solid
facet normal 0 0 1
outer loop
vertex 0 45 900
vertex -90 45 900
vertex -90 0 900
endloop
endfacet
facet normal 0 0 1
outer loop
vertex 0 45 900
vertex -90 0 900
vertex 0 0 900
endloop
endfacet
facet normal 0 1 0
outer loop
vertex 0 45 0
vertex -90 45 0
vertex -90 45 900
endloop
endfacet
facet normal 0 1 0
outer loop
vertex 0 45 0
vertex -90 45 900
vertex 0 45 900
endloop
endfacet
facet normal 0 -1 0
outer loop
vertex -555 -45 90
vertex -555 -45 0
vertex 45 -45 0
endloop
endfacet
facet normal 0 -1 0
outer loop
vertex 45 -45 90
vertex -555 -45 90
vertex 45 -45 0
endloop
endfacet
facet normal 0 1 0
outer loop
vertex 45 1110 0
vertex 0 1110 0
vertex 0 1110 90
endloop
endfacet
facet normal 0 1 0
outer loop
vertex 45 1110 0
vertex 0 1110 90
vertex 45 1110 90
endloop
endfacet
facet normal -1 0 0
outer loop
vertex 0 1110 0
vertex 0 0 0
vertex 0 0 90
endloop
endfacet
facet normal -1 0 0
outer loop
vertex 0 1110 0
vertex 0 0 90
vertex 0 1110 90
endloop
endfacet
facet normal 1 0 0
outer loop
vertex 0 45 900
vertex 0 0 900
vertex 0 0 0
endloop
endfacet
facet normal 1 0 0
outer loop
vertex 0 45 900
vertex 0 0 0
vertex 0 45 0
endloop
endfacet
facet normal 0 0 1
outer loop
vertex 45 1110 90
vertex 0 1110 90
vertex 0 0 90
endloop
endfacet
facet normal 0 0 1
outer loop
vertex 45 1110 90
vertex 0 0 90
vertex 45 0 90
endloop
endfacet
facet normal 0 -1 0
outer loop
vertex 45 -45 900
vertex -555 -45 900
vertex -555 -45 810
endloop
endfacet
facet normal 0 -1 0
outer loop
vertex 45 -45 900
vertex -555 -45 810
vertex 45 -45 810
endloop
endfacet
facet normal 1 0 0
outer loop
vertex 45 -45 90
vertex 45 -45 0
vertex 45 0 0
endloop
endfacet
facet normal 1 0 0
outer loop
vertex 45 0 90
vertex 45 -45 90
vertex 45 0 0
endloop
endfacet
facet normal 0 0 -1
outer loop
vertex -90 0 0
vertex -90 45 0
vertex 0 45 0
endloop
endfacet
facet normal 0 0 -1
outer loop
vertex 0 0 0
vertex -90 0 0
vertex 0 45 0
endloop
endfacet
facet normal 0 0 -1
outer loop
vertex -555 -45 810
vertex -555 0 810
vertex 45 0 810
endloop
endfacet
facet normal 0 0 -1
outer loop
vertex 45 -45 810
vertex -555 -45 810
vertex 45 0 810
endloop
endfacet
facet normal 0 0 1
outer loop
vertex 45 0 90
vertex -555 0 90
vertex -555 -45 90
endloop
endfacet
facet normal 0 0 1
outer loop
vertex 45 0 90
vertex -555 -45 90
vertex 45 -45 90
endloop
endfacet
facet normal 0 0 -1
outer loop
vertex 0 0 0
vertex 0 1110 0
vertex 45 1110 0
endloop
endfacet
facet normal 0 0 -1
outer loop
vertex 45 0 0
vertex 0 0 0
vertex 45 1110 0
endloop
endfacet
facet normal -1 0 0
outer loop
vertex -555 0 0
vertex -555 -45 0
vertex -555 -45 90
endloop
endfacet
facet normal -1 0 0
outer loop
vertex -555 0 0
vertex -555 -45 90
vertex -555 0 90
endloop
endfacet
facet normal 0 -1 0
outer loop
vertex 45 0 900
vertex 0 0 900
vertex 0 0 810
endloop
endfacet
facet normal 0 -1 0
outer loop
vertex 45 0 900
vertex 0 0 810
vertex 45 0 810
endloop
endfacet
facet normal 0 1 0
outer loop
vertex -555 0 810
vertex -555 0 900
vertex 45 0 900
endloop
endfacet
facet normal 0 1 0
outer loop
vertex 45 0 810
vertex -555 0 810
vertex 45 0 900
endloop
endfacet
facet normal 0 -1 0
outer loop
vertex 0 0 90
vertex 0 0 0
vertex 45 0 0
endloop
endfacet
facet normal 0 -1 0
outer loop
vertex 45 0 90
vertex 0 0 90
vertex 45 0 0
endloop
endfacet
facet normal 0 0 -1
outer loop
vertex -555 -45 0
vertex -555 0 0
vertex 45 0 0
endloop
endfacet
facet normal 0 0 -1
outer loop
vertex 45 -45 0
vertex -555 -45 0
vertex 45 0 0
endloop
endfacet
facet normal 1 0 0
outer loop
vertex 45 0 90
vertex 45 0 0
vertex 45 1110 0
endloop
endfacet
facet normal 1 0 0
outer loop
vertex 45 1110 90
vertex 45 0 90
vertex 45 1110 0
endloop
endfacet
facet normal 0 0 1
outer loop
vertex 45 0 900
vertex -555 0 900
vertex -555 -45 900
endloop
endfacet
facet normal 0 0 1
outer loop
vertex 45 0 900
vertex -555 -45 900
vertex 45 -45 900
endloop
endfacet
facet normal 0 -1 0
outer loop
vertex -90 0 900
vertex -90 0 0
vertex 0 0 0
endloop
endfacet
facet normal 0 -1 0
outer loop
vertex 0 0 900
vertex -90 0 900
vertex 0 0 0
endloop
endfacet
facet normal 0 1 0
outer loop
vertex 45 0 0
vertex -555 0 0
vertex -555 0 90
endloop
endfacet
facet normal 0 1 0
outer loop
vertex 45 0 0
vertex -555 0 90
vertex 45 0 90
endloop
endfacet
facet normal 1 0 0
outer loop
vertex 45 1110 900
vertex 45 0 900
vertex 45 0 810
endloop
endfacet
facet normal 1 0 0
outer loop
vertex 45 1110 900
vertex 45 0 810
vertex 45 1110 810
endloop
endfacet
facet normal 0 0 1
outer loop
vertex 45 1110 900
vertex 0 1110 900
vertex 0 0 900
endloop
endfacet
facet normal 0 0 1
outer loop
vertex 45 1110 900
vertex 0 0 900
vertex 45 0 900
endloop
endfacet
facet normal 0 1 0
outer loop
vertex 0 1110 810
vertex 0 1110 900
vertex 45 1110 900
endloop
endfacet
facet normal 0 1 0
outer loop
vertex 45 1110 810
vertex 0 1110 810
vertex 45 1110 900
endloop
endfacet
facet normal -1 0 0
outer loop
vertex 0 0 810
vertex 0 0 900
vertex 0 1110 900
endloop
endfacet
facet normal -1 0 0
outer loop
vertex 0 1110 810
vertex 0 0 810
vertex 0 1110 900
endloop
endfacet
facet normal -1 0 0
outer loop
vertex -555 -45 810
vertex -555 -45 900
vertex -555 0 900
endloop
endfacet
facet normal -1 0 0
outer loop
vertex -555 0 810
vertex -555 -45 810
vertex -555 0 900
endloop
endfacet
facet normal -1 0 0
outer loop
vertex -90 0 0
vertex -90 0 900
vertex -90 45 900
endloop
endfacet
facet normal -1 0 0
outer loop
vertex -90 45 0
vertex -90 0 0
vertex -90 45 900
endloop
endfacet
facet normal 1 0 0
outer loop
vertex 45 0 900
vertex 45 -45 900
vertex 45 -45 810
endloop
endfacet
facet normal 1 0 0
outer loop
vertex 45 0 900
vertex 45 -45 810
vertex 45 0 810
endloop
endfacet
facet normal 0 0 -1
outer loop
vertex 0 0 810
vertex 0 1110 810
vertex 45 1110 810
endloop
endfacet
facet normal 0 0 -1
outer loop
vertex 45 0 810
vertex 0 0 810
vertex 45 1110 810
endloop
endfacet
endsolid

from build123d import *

# Parameters (mm, degrees)
F0_W     = 45
F0_H     = 1110
F1_DEPTH = 90
F2_W     = 600
F2_H     = 45
F3_DEPTH = 90
F4_W     = 90
F4_H     = 45
F5_DEPTH = 900
F6_W     = 45
F6_H     = 1110
F7_DEPTH = 90
F8_W     = 600
F8_H     = 45
F9_DEPTH = 90


with BuildPart() as f1:
    # F0 (on Top) → F1 (new body)
    with BuildSketch(Plane.XY):
        with Locations((22.5, 555)):
            Rectangle(F0_W, F0_H)
    extrude(amount=F1_DEPTH)


with BuildPart() as f3:
    # F2 (on Top) → F3 (new body)
    with BuildSketch(Plane.XY):
        with Locations((-255, -22.5)):
            Rectangle(F2_W, F2_H)
    extrude(amount=F3_DEPTH)


with BuildPart() as f5:
    # F4 (on Top) → F5 (new body)
    with BuildSketch(Plane.XY):
        with Locations((-45, 22.5)):
            Rectangle(F4_W, F4_H)
    extrude(amount=F5_DEPTH)


with BuildPart() as f7:
    # F6 (on face) → F7 (new body)
    with BuildSketch(Plane.XY.offset(900)):
        with Locations((22.5, 555)):
            Rectangle(F6_W, F6_H)
    extrude(amount=-F7_DEPTH)


with BuildPart() as f9:
    # F8 (on face) → F9 (new body)
    with BuildSketch(Plane.XY.offset(900)):
        with Locations((-255, -22.5)):
            Rectangle(F8_W, F8_H)
    extrude(amount=-F9_DEPTH)


solid = Compound([f1.part, f3.part, f5.part, f7.part, f9.part])
